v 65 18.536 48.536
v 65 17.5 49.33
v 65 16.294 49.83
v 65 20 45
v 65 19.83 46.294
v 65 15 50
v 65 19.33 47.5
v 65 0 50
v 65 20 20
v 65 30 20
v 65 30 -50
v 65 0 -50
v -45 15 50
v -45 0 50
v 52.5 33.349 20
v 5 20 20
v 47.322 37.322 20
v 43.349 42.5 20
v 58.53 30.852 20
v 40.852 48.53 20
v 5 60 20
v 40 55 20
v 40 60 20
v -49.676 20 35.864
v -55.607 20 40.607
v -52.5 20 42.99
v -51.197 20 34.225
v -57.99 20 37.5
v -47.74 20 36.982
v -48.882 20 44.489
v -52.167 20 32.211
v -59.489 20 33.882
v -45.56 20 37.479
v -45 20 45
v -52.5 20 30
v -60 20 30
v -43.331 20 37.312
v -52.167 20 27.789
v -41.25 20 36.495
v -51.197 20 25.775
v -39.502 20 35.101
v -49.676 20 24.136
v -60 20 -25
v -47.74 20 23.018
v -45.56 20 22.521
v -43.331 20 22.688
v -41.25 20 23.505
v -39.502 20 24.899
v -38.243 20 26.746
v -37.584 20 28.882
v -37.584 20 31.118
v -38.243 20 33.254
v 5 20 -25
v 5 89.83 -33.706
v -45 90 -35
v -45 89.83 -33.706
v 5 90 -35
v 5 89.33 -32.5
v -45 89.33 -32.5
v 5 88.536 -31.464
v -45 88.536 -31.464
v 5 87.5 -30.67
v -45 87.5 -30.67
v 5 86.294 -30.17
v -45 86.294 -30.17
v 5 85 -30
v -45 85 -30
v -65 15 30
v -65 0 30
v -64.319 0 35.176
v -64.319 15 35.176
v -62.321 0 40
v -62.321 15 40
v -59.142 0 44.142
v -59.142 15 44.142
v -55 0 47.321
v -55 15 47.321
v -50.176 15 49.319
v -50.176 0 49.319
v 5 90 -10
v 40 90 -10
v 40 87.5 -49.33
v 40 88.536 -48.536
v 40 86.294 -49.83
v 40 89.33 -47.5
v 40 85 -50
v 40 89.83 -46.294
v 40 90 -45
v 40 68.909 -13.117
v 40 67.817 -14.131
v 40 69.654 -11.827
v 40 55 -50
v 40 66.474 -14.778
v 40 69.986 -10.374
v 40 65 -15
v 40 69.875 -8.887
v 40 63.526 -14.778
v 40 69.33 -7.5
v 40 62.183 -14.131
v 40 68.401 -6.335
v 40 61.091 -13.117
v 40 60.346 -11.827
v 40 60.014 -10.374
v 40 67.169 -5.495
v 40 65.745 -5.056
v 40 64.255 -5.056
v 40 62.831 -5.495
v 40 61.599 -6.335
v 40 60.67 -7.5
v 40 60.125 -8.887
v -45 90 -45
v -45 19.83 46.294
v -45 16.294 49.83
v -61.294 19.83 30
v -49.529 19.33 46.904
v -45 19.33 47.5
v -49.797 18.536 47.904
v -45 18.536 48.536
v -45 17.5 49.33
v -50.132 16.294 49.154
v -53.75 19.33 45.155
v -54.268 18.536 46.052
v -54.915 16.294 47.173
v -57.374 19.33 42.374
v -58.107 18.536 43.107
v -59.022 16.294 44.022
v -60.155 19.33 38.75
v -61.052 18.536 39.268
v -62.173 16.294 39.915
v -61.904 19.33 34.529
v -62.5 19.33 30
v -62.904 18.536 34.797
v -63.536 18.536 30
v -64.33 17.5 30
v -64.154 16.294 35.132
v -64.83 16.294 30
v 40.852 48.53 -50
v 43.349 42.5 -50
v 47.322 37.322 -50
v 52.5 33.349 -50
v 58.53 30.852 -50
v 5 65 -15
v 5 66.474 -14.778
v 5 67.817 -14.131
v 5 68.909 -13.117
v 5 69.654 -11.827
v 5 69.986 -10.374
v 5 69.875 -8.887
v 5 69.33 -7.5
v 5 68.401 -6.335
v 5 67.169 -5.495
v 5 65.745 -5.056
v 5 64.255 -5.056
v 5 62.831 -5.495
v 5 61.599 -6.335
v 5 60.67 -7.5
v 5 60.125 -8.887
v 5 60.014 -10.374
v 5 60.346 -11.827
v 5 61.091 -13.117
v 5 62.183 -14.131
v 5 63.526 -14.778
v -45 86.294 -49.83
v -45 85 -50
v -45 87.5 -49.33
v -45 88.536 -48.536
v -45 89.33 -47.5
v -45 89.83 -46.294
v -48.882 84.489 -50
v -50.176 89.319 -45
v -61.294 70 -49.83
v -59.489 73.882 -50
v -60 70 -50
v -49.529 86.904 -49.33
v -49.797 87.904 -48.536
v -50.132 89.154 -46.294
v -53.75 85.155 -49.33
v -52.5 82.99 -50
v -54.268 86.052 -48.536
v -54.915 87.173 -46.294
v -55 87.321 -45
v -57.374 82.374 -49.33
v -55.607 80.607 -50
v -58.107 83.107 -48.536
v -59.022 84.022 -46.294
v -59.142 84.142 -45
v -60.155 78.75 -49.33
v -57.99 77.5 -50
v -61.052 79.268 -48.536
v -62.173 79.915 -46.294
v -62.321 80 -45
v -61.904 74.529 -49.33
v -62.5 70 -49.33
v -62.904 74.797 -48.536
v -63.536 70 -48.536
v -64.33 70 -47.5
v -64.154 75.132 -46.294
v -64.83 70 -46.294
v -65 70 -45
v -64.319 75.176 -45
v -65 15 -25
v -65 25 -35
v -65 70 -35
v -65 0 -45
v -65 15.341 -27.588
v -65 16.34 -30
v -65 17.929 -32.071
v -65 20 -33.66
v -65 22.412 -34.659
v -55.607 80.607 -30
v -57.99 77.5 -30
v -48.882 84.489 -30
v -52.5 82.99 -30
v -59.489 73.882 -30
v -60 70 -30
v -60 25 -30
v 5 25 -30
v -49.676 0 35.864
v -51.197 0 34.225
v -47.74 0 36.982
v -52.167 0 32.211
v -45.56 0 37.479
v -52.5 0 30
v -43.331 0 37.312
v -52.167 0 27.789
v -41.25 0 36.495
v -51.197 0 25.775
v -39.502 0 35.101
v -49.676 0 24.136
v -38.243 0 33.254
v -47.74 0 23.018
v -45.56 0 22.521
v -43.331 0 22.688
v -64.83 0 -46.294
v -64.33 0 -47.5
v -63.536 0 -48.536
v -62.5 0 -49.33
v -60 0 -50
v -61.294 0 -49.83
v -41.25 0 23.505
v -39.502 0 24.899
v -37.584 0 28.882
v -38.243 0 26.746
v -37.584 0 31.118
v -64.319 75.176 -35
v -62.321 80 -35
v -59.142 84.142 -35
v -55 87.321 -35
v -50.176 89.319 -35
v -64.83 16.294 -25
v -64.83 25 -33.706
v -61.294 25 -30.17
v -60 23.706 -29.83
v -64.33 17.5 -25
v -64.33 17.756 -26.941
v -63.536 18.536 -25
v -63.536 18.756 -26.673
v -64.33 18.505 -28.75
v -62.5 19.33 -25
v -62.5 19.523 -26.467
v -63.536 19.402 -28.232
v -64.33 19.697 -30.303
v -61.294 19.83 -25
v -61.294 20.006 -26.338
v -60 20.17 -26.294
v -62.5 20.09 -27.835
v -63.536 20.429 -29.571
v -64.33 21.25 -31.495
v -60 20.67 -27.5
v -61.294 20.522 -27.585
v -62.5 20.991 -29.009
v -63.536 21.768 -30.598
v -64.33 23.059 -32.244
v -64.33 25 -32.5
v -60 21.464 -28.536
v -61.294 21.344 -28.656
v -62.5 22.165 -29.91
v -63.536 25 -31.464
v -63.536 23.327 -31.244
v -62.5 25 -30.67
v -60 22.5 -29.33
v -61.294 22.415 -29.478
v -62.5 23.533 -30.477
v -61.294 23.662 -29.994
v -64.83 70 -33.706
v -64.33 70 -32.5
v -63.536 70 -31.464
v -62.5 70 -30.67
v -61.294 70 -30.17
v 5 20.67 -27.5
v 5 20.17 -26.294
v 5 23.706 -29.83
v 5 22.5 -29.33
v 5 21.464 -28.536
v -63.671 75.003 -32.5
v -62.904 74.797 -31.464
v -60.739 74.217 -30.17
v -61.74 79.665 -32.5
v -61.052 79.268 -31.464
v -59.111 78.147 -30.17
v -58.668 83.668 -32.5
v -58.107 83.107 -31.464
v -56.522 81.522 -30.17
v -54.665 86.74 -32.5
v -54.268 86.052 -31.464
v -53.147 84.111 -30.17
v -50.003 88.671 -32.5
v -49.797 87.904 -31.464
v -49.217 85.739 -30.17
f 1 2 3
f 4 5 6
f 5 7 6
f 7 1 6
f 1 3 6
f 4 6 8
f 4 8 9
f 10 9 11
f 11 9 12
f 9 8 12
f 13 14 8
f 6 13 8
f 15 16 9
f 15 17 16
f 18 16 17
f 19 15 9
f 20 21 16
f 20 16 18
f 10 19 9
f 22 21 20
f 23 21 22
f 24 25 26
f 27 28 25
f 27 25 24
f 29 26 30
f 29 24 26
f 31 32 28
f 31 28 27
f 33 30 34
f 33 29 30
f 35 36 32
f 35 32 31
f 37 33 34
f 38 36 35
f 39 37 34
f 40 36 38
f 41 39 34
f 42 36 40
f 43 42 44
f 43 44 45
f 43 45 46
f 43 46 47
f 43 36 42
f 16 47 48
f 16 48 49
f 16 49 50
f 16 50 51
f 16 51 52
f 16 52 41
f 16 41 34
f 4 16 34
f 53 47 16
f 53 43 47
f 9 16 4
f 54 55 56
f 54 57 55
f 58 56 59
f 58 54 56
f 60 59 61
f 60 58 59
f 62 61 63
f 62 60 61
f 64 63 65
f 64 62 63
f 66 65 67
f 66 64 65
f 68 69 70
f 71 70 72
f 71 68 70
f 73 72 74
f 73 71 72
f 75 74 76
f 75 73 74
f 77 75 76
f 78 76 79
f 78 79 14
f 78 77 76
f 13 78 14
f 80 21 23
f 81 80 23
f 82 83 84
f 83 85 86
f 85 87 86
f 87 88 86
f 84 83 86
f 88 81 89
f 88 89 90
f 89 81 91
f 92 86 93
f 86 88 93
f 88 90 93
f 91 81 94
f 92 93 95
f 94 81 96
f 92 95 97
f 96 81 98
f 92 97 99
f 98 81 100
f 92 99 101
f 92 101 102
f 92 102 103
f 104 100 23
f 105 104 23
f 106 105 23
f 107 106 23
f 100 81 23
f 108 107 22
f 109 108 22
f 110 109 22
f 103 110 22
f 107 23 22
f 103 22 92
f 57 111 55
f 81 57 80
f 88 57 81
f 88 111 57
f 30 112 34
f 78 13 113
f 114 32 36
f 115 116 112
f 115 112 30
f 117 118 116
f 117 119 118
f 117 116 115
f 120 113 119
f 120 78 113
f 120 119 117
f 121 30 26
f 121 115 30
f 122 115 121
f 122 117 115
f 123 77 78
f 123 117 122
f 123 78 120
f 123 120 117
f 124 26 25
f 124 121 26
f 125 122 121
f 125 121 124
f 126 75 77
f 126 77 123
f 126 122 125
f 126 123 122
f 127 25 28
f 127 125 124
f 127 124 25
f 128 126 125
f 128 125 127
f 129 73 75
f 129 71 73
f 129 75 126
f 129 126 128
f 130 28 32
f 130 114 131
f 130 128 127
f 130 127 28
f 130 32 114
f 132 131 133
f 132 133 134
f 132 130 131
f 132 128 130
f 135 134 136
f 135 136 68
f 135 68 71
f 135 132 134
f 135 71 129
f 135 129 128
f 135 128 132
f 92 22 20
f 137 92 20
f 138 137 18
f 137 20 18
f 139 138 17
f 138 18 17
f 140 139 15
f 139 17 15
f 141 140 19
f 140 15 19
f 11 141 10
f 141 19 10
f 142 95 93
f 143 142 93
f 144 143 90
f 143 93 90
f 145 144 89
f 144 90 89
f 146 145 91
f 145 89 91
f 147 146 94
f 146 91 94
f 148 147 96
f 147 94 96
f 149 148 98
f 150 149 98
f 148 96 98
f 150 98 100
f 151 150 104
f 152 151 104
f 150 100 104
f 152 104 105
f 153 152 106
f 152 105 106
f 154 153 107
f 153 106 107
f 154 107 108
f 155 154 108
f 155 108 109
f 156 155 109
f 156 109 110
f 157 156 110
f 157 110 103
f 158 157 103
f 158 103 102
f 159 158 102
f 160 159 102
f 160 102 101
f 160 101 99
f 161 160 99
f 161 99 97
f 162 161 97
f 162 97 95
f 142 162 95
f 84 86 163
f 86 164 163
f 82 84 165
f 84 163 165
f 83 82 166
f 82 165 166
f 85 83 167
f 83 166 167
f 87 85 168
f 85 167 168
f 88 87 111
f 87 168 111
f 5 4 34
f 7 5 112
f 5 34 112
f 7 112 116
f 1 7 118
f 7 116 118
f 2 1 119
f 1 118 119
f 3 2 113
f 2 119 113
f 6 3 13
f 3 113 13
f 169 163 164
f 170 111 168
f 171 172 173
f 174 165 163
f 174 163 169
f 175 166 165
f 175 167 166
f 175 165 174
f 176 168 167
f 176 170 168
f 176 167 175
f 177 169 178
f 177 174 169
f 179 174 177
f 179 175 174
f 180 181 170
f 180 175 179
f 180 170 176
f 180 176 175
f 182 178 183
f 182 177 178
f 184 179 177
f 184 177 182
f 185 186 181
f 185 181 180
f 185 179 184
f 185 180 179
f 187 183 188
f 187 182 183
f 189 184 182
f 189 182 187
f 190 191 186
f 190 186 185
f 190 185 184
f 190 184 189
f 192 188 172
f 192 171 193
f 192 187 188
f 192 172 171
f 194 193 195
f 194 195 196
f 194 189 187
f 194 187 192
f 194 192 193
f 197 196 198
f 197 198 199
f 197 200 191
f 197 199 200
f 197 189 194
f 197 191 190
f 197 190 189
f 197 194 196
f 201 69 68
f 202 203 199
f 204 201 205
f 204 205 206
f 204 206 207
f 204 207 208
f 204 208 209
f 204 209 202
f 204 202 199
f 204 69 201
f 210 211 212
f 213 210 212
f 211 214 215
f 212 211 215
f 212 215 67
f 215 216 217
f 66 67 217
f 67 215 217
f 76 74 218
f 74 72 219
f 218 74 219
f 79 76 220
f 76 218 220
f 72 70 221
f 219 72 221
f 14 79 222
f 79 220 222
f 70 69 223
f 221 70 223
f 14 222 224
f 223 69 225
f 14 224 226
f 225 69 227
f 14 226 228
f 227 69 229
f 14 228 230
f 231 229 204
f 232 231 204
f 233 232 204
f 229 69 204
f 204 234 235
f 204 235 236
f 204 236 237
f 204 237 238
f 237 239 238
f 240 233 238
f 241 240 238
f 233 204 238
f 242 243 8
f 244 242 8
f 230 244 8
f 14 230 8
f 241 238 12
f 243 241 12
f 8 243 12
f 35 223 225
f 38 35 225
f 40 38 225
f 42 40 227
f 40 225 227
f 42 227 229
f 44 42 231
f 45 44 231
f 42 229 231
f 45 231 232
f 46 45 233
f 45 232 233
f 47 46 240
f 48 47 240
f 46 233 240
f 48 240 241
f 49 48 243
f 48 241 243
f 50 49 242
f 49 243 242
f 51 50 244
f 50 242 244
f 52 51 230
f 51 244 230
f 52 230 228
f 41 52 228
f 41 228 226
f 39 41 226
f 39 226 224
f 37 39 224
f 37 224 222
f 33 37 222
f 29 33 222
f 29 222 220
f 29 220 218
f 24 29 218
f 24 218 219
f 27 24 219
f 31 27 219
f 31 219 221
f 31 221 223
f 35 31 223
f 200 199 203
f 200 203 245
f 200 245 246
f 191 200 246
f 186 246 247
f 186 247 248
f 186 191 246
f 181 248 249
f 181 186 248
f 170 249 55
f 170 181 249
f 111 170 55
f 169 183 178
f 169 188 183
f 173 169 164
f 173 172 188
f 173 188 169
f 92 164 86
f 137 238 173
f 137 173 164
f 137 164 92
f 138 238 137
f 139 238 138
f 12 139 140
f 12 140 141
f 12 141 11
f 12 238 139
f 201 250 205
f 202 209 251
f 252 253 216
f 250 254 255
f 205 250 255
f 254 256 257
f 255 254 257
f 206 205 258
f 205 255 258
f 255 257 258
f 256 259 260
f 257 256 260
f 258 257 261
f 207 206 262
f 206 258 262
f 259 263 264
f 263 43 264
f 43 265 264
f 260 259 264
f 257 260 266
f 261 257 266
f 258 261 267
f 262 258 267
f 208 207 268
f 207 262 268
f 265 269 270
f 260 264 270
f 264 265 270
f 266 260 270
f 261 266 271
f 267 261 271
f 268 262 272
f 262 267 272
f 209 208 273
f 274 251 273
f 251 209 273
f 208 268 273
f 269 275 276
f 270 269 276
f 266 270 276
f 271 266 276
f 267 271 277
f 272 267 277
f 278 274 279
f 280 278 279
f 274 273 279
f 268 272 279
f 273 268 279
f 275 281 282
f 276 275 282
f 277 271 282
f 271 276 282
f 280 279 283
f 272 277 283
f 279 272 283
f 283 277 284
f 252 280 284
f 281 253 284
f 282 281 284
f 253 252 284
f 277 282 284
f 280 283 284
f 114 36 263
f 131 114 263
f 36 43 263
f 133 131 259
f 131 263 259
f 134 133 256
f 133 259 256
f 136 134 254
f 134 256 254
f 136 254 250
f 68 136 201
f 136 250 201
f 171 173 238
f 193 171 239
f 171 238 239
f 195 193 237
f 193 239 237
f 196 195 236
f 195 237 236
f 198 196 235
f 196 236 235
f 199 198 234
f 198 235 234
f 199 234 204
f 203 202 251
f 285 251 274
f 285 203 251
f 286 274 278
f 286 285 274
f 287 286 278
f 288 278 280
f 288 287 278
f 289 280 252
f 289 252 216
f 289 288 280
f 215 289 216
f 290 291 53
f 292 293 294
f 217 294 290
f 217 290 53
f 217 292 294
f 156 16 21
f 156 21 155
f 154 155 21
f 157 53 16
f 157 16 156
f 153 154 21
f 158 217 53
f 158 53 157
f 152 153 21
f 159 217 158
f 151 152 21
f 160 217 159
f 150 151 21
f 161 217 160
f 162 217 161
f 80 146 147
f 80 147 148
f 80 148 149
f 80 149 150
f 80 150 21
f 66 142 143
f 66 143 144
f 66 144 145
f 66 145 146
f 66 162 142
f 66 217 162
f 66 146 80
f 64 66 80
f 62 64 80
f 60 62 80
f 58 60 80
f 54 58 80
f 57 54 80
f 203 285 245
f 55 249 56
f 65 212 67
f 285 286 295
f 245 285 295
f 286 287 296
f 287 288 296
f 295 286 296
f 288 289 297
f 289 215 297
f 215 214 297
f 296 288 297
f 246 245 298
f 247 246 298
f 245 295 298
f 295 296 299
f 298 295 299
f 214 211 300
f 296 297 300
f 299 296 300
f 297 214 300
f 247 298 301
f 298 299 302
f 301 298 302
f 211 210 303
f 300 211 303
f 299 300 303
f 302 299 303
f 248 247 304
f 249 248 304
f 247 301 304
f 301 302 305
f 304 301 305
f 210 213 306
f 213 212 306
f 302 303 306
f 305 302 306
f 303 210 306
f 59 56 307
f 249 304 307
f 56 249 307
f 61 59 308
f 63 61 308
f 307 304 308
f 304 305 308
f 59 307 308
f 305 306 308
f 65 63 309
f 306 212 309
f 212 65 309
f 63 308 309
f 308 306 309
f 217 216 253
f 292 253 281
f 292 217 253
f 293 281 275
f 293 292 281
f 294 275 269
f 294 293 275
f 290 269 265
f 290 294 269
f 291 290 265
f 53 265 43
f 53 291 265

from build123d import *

# Parameters (mm, degrees)
SKETCH1_W                  = 130
SKETCH1_H                  = 100
BOSS_EXTRUDE1_DEPTH        = 20
SKETCH2_W                  = 130
SKETCH2_H                  = 20
BOSS_EXTRUDE2_DEPTH        = 70
FILLET1_R                  = 20
SKETCH3_W                  = 60
SKETCH3_H                  = 70
BOSS_EXTRUDE3_DEPTH        = 50
CUT_EXTRUDE1_DEPTH         = 132.244047484
CHAMFER1_SIZE              = 30
F_10_0_10_DIAMETER_HOLE1_D = 10
F_15_0_15_DIAMETER_HOLE1_D = 15
FILLET2_R                  = 5


with BuildPart() as part:
    # Sketch1 → Boss-Extrude1 (new body)
    with BuildSketch(Plane(origin=(0, 0, 0), x_dir=(1, 0, 0), z_dir=(0, 1, 0))):
        Rectangle(SKETCH1_W, SKETCH1_H)
    extrude(amount=BOSS_EXTRUDE1_DEPTH)

    # Sketch2 → Boss-Extrude2 (add)
    with BuildSketch(Plane(origin=(0, 20, 0), x_dir=(1, 0, 0), z_dir=(0, 1, 0))):
        with Locations((0, 40)):
            Rectangle(SKETCH2_W, SKETCH2_H)
    extrude(amount=BOSS_EXTRUDE2_DEPTH)

    # Fillet1
    fillet1_edges = [part.edges().sort_by_distance(p)[0] for p in [
        (-65, 10, 50),
        (-65, 90, -40),
    ]]
    fillet(fillet1_edges, radius=FILLET1_R)

    # Sketch3 → Boss-Extrude3 (add)
    with BuildSketch(Plane.XY.offset(-30)):
        with Locations((35, 55)):
            Rectangle(SKETCH3_W, SKETCH3_H)
    extrude(amount=BOSS_EXTRUDE3_DEPTH)

    # Sketch4 → Cut-Extrude1 (cut, through all)
    with BuildSketch(Plane.XY.offset(20)):
        with BuildLine():
            Line((40, 90), (40, 55))
            ThreePointArc((40, 55), (47.32233047, 37.32233047), (65, 30))
            Line((65, 30), (65, 90))
            Line((65, 90), (40, 90))
        make_face()
    extrude(amount=-CUT_EXTRUDE1_DEPTH, mode=Mode.SUBTRACT)

    # Chamfer1
    chamfer1_edges = [part.edges().sort_by_distance(p)[0] for p in [
        (22.5, 90, 20),
    ]]
    chamfer(chamfer1_edges, length=CHAMFER1_SIZE)

    # Ø10.0 (10) Diameter Hole1 (through all)
    with Locations(Plane.ZY.offset(-5)):
        with Locations((-10, 65)):
            Hole(F_10_0_10_DIAMETER_HOLE1_D / 2)

    # Ø15.0 (15) Diameter Hole1 (through all)
    with Locations(Plane(origin=(0, 20, 0), x_dir=(1, 0, 0), z_dir=(0, 1, 0))):
        with Locations((-45, -30)):
            Hole(F_15_0_15_DIAMETER_HOLE1_D / 2)

    # Fillet2
    fillet2_edges = [part.edges().sort_by_distance(p)[0] for p in [
        (-65, 20, 0),
        (10, 20, 50),
        (-65, 35, -50),
        (-2.5, 90, -50),
        (-20, 90, -30),
        (-65, 45, -30),
        (-59.142135624, 20, 44.142135624),
        (-59.142135624, 84.142135624, -50),
        (-59.142135624, 84.142135624, -30),
        (-30, 20, -30),
    ]]
    fillet(fillet2_edges, radius=FILLET2_R)


solid = part.part
